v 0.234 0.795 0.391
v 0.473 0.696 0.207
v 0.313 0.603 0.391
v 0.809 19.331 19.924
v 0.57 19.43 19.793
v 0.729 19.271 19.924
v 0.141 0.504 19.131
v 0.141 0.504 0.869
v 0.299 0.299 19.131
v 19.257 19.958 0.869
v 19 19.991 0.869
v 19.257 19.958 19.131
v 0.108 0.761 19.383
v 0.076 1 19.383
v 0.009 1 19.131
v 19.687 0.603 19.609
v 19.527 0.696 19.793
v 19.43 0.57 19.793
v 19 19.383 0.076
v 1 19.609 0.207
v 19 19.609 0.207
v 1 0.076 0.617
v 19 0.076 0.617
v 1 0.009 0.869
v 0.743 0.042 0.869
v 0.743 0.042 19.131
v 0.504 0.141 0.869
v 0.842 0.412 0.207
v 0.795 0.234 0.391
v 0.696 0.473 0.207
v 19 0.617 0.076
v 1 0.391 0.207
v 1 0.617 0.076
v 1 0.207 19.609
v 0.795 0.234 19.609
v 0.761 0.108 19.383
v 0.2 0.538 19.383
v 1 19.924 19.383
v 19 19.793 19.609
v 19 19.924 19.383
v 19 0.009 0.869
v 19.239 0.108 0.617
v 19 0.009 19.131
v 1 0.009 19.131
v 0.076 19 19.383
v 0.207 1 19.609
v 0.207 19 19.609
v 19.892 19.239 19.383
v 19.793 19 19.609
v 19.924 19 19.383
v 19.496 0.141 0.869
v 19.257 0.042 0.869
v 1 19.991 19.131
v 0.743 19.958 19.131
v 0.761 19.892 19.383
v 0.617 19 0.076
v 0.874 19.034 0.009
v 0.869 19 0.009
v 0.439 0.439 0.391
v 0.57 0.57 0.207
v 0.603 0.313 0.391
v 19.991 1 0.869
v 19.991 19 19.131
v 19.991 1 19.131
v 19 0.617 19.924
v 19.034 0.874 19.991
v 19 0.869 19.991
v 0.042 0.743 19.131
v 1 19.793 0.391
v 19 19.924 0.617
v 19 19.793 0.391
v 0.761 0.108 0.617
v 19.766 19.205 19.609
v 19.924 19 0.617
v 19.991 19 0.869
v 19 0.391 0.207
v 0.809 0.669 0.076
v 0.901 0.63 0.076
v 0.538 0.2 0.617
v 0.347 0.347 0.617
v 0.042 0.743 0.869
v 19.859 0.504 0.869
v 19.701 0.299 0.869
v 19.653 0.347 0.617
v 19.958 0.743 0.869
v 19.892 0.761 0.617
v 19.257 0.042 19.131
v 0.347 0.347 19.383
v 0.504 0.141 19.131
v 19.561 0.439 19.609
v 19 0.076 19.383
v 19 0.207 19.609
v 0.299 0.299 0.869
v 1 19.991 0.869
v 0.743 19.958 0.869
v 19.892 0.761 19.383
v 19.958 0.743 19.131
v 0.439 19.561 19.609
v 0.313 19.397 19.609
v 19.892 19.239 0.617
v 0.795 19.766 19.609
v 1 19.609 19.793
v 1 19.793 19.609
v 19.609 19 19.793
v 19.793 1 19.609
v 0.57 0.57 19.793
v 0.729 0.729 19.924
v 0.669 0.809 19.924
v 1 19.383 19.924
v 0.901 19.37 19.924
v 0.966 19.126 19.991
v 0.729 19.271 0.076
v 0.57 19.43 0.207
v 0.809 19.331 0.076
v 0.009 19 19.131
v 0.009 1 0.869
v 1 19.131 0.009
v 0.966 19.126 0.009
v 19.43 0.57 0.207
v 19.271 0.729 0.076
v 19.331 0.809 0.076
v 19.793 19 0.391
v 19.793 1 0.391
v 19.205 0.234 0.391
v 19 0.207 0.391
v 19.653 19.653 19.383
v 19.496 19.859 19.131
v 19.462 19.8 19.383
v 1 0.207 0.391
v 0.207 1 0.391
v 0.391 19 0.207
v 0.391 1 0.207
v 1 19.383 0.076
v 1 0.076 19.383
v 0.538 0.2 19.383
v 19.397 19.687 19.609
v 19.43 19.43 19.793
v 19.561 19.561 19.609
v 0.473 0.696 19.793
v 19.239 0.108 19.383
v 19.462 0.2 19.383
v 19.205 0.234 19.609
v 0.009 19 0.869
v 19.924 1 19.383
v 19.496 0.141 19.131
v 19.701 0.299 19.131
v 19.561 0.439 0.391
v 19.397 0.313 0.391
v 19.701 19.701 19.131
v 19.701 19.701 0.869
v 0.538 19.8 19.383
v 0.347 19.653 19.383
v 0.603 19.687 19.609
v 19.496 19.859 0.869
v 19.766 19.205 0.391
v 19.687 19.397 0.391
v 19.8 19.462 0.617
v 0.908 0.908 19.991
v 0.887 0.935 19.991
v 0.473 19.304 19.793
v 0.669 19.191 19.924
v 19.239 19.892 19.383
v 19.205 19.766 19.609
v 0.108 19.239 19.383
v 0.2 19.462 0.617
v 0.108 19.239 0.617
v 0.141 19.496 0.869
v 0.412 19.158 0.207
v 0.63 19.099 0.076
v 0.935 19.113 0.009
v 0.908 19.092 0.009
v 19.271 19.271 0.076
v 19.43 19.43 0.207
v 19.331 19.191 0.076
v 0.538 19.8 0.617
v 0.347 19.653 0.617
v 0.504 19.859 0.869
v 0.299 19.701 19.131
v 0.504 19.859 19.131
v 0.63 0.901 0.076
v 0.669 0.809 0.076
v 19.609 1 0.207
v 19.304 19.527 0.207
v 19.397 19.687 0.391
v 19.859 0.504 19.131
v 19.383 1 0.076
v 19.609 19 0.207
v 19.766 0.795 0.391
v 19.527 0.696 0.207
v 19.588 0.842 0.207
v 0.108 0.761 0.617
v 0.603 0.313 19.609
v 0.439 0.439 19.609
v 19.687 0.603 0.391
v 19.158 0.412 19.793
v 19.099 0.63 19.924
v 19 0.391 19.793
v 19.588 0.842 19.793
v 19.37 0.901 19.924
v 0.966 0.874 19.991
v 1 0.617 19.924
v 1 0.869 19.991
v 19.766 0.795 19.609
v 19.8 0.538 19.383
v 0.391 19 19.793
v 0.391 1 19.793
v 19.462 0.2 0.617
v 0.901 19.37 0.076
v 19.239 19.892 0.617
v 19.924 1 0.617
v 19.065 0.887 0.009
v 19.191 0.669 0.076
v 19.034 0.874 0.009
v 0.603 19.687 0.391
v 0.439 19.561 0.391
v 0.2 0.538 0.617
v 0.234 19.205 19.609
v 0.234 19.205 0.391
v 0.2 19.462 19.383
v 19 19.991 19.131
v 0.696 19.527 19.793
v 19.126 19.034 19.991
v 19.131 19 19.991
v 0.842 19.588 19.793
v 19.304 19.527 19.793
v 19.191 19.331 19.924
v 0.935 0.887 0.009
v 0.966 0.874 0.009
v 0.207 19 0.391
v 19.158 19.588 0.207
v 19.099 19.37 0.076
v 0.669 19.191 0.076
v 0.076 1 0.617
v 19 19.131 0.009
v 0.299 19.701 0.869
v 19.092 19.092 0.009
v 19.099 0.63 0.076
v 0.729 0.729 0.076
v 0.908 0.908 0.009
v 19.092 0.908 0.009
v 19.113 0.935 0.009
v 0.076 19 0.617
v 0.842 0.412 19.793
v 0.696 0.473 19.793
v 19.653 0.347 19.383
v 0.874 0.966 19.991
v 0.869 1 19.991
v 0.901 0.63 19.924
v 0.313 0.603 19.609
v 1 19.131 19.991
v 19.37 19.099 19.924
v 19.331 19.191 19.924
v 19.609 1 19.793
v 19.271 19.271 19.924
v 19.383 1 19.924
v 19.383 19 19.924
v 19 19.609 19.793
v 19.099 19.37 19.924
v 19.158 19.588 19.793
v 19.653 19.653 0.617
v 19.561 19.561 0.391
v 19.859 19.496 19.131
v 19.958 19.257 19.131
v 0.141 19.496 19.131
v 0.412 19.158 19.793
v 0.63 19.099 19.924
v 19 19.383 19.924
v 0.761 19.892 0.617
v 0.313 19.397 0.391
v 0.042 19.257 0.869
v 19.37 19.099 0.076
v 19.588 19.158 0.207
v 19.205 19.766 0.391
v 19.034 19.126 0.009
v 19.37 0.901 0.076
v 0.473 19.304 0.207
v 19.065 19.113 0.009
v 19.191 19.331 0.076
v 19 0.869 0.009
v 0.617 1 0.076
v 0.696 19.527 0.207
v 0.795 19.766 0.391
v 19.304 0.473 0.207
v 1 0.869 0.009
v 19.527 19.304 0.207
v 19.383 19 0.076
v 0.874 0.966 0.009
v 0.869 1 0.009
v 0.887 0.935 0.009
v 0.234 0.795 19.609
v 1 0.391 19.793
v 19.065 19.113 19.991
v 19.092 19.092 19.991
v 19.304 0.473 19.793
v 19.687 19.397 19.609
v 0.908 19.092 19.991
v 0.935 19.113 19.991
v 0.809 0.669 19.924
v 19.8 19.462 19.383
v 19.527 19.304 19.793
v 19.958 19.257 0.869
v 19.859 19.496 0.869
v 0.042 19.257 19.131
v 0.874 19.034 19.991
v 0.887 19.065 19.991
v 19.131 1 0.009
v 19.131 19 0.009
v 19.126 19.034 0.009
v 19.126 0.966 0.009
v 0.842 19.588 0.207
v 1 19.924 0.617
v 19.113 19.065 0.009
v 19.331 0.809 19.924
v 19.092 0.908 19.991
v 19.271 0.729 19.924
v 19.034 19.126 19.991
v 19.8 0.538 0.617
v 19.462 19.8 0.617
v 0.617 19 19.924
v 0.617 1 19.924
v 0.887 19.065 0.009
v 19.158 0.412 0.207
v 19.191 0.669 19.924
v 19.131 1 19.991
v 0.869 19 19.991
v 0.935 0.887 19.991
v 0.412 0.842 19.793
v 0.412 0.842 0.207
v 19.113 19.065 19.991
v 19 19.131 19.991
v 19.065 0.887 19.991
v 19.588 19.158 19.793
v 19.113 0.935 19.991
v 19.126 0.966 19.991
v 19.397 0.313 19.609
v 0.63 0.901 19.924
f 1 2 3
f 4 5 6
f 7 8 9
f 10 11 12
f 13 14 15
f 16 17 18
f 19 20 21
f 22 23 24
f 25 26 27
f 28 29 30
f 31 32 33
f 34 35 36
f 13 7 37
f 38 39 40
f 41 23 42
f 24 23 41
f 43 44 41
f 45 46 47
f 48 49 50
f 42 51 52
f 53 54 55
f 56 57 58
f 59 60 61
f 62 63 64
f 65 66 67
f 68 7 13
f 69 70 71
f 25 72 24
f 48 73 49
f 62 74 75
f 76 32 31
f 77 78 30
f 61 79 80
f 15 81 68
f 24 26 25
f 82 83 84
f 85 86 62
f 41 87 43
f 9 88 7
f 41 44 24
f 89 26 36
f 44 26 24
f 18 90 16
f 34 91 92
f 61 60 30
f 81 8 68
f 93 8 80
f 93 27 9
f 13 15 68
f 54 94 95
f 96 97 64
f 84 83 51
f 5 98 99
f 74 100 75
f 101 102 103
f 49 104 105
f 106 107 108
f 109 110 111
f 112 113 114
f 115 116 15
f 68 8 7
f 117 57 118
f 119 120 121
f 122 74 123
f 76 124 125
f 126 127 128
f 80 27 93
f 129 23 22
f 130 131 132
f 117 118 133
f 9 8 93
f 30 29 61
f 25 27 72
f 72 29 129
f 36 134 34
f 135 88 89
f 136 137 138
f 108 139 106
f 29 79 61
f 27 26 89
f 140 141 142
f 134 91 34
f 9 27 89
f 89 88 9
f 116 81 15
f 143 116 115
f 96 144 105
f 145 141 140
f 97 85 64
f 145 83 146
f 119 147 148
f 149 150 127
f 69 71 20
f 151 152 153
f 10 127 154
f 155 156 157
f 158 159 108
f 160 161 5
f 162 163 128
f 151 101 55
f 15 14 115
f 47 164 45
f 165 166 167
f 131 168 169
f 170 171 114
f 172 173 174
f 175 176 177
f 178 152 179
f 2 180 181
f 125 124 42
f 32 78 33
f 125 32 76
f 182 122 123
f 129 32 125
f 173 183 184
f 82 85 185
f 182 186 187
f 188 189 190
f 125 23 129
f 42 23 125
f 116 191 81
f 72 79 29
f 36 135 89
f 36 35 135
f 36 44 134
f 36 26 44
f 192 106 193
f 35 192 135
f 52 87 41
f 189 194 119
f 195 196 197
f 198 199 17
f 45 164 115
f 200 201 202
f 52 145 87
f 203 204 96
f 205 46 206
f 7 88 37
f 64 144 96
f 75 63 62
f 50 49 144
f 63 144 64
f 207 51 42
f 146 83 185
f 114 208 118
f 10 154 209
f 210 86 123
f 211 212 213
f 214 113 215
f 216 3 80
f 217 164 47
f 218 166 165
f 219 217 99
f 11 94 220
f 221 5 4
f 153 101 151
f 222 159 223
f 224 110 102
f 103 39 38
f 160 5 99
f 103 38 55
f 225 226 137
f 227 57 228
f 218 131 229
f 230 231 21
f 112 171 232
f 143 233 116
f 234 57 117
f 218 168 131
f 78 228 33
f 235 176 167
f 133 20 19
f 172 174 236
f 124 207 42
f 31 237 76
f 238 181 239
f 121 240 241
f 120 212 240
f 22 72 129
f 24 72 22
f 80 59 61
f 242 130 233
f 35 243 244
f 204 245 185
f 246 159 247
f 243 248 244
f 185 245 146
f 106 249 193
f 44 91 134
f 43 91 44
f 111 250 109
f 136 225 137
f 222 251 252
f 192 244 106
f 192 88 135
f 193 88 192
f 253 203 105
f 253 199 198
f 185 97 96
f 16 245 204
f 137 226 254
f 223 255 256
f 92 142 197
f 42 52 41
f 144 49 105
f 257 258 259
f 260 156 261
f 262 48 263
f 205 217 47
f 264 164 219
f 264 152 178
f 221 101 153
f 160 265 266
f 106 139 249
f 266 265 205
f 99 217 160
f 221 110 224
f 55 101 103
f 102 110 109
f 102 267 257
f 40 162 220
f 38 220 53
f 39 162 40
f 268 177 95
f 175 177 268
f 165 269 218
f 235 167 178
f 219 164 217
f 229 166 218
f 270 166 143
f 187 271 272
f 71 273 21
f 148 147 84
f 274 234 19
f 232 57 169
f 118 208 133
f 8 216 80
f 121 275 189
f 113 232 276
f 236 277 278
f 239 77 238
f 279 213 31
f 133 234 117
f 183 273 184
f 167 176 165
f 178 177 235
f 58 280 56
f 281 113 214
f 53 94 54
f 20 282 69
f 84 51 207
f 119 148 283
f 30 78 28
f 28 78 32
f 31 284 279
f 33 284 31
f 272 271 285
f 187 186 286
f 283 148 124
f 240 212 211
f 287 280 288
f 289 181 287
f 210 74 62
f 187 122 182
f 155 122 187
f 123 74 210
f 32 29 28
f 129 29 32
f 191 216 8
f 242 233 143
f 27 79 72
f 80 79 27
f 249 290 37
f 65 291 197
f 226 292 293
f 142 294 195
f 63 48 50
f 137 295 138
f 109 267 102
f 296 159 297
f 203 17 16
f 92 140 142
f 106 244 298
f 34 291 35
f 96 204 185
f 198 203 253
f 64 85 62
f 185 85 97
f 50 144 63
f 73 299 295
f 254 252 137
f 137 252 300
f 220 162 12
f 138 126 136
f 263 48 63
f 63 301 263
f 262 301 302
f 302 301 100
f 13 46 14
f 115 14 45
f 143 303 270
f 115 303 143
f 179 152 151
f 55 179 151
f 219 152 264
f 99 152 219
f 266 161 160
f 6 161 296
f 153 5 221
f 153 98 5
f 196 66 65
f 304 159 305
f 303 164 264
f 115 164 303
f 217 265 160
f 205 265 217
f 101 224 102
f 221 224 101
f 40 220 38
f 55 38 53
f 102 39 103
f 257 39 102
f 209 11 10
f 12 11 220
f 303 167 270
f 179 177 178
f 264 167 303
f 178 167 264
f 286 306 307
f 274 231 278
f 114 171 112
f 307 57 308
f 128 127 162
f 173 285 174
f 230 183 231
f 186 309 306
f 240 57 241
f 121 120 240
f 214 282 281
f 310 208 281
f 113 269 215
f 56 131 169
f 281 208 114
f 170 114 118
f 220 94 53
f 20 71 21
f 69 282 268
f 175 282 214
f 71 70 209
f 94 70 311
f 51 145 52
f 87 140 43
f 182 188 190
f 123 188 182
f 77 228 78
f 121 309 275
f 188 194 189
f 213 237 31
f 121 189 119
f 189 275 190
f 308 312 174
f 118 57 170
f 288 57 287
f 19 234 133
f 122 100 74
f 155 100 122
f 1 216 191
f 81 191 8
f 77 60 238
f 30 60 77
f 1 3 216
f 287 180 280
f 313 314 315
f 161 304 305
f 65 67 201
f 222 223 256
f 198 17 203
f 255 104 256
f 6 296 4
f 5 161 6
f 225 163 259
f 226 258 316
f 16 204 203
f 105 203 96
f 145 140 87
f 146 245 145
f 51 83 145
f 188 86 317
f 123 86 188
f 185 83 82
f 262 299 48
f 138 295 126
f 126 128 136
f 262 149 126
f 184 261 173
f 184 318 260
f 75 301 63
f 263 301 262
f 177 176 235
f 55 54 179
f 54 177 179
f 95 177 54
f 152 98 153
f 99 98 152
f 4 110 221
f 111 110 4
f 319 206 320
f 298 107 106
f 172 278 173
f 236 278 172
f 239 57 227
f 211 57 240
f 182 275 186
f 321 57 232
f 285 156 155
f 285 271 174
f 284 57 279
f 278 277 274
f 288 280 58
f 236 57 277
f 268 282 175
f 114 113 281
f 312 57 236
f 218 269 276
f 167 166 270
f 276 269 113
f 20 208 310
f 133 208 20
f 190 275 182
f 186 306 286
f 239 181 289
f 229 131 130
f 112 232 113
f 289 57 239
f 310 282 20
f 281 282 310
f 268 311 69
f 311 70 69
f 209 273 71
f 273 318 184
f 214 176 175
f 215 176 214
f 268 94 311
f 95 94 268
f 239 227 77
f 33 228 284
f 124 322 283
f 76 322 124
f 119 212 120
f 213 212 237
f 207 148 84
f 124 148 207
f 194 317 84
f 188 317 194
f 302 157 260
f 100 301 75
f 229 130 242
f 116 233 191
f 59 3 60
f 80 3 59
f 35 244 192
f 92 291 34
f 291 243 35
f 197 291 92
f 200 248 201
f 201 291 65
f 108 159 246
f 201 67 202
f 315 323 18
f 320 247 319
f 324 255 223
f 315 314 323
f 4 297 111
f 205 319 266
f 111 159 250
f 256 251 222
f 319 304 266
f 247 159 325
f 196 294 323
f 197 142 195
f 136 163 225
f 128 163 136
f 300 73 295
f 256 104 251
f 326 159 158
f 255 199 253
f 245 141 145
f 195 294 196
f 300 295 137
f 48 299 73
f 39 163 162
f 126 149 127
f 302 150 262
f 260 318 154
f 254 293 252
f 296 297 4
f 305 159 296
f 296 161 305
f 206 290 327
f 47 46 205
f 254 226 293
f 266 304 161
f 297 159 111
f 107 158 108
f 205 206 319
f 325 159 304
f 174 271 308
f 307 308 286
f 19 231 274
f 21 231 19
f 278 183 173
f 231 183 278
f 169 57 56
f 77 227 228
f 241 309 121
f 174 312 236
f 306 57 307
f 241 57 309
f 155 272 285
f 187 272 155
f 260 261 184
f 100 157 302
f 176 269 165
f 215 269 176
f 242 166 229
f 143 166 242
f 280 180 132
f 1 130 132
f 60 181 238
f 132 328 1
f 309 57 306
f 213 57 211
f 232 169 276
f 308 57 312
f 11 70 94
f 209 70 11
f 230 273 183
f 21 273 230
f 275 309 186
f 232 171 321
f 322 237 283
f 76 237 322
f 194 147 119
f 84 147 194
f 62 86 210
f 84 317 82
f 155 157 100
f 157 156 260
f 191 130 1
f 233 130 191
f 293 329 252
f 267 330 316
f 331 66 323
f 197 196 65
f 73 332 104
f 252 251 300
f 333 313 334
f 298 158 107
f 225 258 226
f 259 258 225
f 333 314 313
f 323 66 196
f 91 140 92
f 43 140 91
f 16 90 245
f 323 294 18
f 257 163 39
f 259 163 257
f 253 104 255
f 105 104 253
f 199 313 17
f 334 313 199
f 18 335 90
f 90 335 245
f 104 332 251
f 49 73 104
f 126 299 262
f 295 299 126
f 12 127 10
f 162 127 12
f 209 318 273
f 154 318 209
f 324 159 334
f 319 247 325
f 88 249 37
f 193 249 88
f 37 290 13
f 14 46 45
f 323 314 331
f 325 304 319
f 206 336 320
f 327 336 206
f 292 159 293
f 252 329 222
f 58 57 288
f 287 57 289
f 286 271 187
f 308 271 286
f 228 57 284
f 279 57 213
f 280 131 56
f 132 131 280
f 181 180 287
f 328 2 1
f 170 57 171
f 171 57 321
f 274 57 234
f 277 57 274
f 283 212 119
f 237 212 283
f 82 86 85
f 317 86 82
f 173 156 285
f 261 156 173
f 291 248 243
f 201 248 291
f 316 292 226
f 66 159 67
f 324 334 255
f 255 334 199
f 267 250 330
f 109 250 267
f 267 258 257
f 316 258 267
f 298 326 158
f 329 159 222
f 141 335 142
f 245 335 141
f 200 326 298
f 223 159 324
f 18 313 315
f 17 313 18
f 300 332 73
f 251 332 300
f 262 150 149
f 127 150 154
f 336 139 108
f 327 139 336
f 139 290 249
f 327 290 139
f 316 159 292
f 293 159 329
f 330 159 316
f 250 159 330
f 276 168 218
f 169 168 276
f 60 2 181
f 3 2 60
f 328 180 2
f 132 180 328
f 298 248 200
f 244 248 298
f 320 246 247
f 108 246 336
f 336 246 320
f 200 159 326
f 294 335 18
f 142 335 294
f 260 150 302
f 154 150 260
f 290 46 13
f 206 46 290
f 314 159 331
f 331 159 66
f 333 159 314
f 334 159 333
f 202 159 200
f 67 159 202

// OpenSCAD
$fa=3.000000;
$fs=0.500000;
hull()union(){union(){union(){translate([1,1,1])sphere($fn=24,r=1);translate([10,0,0])mirror([1,0,0])translate([-10,0,0])translate([1,1,1])sphere($fn=24,r=1);}translate([0,10,0])mirror([0,1,0])translate([0,-10,0])union(){translate([1,1,1])sphere($fn=24,r=1);translate([10,0,0])mirror([1,0,0])translate([-10,0,0])translate([1,1,1])sphere($fn=24,r=1);}}translate([0,0,10])mirror([0,0,1])translate([0,0,-10])union(){union(){translate([1,1,1])sphere($fn=24,r=1);translate([10,0,0])mirror([1,0,0])translate([-10,0,0])translate([1,1,1])sphere($fn=24,r=1);}translate([0,10,0])mirror([0,1,0])translate([0,-10,0])union(){translate([1,1,1])sphere($fn=24,r=1);translate([10,0,0])mirror([1,0,0])translate([-10,0,0])translate([1,1,1])sphere($fn=24,r=1);}}}
